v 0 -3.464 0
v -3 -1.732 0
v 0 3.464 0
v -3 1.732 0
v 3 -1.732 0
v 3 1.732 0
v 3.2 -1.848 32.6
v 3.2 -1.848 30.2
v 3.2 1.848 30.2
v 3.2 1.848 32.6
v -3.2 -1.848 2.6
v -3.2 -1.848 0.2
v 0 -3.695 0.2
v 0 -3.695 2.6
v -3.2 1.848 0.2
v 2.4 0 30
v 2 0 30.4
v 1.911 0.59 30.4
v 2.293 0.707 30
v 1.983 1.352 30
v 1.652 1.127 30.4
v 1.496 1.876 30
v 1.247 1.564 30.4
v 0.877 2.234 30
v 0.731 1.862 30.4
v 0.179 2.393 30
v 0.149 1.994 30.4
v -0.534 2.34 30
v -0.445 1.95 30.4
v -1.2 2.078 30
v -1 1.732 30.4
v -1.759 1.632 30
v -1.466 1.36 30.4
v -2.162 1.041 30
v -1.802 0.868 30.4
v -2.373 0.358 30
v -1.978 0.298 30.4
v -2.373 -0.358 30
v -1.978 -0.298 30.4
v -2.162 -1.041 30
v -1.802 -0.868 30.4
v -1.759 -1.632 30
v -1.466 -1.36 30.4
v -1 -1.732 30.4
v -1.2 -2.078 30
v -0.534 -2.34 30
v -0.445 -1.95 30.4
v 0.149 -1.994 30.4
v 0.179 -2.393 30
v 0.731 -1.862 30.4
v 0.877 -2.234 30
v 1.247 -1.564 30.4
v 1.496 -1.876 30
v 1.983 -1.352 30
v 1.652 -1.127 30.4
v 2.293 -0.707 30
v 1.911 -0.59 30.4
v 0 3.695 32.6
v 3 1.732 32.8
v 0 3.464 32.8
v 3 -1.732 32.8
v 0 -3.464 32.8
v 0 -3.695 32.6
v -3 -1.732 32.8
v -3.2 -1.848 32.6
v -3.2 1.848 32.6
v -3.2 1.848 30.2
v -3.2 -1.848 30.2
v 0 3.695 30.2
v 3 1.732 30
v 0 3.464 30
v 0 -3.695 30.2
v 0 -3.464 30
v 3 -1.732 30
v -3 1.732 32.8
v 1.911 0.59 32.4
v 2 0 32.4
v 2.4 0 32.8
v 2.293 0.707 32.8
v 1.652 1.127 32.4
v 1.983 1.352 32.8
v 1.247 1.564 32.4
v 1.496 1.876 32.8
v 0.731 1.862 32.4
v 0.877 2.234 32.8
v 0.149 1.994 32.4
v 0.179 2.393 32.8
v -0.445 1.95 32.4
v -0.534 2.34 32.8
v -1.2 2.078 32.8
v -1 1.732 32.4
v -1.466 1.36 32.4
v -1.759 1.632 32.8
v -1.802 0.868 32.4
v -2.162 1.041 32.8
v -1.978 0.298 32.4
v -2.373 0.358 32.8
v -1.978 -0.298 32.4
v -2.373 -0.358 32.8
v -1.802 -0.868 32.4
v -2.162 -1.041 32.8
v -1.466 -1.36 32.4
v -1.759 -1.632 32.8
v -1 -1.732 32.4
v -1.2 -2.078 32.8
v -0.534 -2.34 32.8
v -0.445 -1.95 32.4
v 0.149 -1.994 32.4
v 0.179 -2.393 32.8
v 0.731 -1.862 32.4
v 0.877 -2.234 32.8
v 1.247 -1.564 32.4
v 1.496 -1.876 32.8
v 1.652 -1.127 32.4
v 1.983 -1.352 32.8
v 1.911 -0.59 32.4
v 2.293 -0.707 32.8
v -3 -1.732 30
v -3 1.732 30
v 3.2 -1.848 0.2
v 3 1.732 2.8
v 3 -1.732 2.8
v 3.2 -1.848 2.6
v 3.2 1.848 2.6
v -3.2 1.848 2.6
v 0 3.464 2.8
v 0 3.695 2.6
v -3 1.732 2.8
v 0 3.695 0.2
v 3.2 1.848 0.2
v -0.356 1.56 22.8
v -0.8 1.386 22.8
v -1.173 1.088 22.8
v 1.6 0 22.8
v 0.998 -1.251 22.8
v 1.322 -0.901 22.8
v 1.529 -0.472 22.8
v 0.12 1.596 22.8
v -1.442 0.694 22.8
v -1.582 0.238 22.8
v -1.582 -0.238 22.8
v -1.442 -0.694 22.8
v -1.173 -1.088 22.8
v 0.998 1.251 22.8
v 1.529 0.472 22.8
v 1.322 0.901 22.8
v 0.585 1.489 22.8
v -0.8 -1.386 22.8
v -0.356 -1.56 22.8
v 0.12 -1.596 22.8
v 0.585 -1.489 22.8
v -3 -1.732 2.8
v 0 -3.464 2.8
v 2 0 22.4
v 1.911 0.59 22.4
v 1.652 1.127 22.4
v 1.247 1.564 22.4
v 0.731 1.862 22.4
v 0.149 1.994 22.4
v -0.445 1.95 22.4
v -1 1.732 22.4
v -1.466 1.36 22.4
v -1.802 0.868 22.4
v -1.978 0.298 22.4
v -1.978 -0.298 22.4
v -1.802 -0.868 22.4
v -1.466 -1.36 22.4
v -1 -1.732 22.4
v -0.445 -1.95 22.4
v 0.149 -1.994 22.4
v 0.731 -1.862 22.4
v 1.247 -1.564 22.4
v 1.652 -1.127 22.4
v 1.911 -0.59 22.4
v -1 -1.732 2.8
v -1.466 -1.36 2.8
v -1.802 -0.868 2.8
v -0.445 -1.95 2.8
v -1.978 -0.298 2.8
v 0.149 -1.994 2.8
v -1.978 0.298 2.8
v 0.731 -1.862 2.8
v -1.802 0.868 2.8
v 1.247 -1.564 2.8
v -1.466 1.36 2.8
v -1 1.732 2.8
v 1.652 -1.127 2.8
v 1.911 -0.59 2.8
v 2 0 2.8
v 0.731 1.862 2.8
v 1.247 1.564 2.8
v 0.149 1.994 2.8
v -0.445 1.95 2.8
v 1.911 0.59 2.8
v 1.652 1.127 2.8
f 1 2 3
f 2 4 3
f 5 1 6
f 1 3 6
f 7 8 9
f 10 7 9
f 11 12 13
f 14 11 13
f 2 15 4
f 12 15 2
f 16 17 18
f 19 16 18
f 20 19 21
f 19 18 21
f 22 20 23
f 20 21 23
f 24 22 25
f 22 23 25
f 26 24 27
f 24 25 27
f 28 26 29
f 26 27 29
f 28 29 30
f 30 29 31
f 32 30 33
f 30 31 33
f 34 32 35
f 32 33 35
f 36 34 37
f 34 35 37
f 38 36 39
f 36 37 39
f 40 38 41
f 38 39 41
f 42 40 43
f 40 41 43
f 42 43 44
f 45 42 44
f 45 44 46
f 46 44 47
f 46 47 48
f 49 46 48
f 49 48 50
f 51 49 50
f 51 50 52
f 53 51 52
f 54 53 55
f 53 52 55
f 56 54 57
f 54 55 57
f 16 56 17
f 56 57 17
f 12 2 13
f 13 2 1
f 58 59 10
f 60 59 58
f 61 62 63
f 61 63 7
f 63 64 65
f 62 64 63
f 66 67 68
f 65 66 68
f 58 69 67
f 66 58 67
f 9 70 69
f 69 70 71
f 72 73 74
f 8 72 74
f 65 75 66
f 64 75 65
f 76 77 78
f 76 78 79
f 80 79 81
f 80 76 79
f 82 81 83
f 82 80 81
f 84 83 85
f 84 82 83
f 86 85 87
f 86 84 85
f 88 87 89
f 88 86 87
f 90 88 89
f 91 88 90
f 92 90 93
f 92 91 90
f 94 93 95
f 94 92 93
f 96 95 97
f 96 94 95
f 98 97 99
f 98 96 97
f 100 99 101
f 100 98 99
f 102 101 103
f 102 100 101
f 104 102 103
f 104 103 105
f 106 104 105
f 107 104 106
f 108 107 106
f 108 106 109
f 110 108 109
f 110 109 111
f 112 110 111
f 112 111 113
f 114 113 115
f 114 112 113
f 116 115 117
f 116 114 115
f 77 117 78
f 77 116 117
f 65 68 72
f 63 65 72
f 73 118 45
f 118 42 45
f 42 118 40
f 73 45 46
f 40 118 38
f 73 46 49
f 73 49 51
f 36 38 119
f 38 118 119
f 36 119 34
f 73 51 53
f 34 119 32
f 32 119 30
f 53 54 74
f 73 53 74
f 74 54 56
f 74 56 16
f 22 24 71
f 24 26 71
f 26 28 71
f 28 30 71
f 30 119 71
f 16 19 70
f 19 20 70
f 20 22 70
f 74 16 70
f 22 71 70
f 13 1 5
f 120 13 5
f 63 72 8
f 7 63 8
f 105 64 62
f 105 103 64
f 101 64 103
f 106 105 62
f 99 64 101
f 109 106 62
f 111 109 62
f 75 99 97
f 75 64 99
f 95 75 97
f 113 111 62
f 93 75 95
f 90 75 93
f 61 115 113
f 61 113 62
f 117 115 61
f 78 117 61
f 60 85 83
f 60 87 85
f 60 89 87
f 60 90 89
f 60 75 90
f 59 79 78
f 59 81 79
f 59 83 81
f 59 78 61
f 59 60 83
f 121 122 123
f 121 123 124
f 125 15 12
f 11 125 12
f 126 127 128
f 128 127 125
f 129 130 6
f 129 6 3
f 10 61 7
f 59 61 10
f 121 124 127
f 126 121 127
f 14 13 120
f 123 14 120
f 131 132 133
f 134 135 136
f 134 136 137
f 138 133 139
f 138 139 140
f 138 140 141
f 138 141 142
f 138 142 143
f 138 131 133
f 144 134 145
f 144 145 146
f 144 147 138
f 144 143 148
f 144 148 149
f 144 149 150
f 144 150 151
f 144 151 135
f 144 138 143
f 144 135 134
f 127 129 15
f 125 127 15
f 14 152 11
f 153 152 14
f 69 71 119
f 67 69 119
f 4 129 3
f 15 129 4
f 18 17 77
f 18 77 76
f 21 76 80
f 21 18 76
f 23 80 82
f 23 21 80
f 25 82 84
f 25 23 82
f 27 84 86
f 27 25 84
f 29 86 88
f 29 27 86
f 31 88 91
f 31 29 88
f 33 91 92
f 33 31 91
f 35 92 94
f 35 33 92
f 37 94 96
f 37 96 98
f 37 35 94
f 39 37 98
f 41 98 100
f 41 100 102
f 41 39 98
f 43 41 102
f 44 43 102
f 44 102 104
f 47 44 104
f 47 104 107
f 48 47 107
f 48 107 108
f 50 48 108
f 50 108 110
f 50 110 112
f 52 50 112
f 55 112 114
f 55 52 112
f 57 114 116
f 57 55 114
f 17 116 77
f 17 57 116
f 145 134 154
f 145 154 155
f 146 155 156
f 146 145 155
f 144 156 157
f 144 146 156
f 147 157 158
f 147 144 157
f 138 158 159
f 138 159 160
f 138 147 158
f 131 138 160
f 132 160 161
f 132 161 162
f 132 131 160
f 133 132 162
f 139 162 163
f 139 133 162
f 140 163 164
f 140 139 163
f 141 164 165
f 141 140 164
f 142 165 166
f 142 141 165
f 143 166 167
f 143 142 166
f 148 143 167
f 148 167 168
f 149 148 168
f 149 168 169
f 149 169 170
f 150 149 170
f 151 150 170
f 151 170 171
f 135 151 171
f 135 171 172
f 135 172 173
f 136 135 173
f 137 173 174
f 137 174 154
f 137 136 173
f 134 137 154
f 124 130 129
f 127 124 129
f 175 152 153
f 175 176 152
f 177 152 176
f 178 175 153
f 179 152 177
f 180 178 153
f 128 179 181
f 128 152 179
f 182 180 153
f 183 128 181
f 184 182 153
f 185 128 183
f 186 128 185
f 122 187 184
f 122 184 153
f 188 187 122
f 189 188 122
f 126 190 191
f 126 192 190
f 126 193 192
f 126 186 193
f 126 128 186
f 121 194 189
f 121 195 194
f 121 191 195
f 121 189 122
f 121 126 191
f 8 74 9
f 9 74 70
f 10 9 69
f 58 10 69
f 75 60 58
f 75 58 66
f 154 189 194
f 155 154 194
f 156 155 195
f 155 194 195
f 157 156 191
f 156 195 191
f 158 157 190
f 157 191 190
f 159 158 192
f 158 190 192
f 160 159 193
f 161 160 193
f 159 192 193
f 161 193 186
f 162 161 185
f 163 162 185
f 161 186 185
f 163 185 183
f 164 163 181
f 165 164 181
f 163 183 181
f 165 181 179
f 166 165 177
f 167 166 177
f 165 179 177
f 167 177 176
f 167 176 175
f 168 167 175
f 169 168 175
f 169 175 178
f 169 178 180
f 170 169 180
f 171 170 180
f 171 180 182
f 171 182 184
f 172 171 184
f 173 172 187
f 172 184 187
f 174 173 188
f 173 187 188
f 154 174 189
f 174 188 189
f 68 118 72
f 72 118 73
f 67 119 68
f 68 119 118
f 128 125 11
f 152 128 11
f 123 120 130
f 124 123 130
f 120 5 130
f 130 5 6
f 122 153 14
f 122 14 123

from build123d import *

# Parameters (mm, degrees)
F3_DEPTH   = 2.8
F4_R       = 2
F5_DEPTH   = 20
F7_R       = 2
F8_DEPTH   = 2.8
F9_SIZE2   = 0.2
F9_SIZE    = 0.2
F9_2_SIZE2 = 0.2
F9_2_SIZE  = 0.2
F10_SIZE   = 0.4
F10_2_SIZE = 0.4


with BuildPart() as f3:
    # F2 (on Top) → F3 (new body)
    with BuildSketch(Plane.XY):
        Polygon((0, -3.6950417228), (3.2, -1.8475208614), (3.2, 1.8475208614), (0, 3.6950417228), (-3.2, 1.8475208614), (-3.2, -1.8475208614), align=None)
    extrude(amount=F3_DEPTH)

    # F4 (on face) → F5 (join)
    with BuildSketch(Plane.XY.offset(2.8)):
        Circle(F4_R)
    extrude(amount=F5_DEPTH)

    # F9
    f9_edges = [f3.edges().sort_by_distance(p)[0] for p in [
        (-1.6, -2.771281, 0),
        (1.6, -2.771281, 0),
        (3.2, 0, 0),
        (1.6, 2.771281, 0),
        (-1.6, 2.771281, 0),
        (-3.2, 0, 0),
        (-3.2, 0, 2.8),
        (-1.6, -2.771281, 2.8),
        (1.6, -2.771281, 2.8),
        (-1.6, 2.771281, 2.8),
        (1.6, 2.771281, 2.8),
        (3.2, 0, 2.8),
    ]]
    chamfer(f9_edges, length=F9_SIZE, length2=F9_SIZE2)

    # F10
    f10_edges = [f3.edges().sort_by_distance(p)[0] for p in [
        (-2, 0, 22.8),
    ]]
    chamfer(f10_edges, length=F10_SIZE)


with BuildPart() as f8:
    # F7 (on offset) → F8 (new body)
    with BuildSketch(Plane.XY.offset(30)):
        Polygon((0, -3.6950417228), (3.2, -1.8475208614), (3.2, 1.8475208614), (0, 3.6950417228), (-3.2, 1.8475208614), (-3.2, -1.8475208614), align=None)
        Circle(F7_R, mode=Mode.SUBTRACT)
    extrude(amount=F8_DEPTH)

    # F9#2
    f9_2_edges = [f8.edges().sort_by_distance(p)[0] for p in [
        (1.6, 2.771281, 32.8),
        (-1.6, 2.771281, 32.8),
        (-3.2, 0, 32.8),
        (-1.6, -2.771281, 32.8),
        (1.6, -2.771281, 32.8),
        (3.2, 0, 32.8),
        (1.6, -2.771281, 30),
        (-1.6, -2.771281, 30),
        (-3.2, 0, 30),
        (-1.6, 2.771281, 30),
        (1.6, 2.771281, 30),
        (3.2, 0, 30),
    ]]
    chamfer(f9_2_edges, length=F9_2_SIZE, length2=F9_2_SIZE2)

    # F10#2
    f10_2_edges = [f8.edges().sort_by_distance(p)[0] for p in [
        (2, 0, 31.4),
        (-2, 0, 30),
        (-2, 0, 32.8),
    ]]
    chamfer(f10_2_edges, length=F10_2_SIZE)


solid = Compound([f3.part, f8.part])
